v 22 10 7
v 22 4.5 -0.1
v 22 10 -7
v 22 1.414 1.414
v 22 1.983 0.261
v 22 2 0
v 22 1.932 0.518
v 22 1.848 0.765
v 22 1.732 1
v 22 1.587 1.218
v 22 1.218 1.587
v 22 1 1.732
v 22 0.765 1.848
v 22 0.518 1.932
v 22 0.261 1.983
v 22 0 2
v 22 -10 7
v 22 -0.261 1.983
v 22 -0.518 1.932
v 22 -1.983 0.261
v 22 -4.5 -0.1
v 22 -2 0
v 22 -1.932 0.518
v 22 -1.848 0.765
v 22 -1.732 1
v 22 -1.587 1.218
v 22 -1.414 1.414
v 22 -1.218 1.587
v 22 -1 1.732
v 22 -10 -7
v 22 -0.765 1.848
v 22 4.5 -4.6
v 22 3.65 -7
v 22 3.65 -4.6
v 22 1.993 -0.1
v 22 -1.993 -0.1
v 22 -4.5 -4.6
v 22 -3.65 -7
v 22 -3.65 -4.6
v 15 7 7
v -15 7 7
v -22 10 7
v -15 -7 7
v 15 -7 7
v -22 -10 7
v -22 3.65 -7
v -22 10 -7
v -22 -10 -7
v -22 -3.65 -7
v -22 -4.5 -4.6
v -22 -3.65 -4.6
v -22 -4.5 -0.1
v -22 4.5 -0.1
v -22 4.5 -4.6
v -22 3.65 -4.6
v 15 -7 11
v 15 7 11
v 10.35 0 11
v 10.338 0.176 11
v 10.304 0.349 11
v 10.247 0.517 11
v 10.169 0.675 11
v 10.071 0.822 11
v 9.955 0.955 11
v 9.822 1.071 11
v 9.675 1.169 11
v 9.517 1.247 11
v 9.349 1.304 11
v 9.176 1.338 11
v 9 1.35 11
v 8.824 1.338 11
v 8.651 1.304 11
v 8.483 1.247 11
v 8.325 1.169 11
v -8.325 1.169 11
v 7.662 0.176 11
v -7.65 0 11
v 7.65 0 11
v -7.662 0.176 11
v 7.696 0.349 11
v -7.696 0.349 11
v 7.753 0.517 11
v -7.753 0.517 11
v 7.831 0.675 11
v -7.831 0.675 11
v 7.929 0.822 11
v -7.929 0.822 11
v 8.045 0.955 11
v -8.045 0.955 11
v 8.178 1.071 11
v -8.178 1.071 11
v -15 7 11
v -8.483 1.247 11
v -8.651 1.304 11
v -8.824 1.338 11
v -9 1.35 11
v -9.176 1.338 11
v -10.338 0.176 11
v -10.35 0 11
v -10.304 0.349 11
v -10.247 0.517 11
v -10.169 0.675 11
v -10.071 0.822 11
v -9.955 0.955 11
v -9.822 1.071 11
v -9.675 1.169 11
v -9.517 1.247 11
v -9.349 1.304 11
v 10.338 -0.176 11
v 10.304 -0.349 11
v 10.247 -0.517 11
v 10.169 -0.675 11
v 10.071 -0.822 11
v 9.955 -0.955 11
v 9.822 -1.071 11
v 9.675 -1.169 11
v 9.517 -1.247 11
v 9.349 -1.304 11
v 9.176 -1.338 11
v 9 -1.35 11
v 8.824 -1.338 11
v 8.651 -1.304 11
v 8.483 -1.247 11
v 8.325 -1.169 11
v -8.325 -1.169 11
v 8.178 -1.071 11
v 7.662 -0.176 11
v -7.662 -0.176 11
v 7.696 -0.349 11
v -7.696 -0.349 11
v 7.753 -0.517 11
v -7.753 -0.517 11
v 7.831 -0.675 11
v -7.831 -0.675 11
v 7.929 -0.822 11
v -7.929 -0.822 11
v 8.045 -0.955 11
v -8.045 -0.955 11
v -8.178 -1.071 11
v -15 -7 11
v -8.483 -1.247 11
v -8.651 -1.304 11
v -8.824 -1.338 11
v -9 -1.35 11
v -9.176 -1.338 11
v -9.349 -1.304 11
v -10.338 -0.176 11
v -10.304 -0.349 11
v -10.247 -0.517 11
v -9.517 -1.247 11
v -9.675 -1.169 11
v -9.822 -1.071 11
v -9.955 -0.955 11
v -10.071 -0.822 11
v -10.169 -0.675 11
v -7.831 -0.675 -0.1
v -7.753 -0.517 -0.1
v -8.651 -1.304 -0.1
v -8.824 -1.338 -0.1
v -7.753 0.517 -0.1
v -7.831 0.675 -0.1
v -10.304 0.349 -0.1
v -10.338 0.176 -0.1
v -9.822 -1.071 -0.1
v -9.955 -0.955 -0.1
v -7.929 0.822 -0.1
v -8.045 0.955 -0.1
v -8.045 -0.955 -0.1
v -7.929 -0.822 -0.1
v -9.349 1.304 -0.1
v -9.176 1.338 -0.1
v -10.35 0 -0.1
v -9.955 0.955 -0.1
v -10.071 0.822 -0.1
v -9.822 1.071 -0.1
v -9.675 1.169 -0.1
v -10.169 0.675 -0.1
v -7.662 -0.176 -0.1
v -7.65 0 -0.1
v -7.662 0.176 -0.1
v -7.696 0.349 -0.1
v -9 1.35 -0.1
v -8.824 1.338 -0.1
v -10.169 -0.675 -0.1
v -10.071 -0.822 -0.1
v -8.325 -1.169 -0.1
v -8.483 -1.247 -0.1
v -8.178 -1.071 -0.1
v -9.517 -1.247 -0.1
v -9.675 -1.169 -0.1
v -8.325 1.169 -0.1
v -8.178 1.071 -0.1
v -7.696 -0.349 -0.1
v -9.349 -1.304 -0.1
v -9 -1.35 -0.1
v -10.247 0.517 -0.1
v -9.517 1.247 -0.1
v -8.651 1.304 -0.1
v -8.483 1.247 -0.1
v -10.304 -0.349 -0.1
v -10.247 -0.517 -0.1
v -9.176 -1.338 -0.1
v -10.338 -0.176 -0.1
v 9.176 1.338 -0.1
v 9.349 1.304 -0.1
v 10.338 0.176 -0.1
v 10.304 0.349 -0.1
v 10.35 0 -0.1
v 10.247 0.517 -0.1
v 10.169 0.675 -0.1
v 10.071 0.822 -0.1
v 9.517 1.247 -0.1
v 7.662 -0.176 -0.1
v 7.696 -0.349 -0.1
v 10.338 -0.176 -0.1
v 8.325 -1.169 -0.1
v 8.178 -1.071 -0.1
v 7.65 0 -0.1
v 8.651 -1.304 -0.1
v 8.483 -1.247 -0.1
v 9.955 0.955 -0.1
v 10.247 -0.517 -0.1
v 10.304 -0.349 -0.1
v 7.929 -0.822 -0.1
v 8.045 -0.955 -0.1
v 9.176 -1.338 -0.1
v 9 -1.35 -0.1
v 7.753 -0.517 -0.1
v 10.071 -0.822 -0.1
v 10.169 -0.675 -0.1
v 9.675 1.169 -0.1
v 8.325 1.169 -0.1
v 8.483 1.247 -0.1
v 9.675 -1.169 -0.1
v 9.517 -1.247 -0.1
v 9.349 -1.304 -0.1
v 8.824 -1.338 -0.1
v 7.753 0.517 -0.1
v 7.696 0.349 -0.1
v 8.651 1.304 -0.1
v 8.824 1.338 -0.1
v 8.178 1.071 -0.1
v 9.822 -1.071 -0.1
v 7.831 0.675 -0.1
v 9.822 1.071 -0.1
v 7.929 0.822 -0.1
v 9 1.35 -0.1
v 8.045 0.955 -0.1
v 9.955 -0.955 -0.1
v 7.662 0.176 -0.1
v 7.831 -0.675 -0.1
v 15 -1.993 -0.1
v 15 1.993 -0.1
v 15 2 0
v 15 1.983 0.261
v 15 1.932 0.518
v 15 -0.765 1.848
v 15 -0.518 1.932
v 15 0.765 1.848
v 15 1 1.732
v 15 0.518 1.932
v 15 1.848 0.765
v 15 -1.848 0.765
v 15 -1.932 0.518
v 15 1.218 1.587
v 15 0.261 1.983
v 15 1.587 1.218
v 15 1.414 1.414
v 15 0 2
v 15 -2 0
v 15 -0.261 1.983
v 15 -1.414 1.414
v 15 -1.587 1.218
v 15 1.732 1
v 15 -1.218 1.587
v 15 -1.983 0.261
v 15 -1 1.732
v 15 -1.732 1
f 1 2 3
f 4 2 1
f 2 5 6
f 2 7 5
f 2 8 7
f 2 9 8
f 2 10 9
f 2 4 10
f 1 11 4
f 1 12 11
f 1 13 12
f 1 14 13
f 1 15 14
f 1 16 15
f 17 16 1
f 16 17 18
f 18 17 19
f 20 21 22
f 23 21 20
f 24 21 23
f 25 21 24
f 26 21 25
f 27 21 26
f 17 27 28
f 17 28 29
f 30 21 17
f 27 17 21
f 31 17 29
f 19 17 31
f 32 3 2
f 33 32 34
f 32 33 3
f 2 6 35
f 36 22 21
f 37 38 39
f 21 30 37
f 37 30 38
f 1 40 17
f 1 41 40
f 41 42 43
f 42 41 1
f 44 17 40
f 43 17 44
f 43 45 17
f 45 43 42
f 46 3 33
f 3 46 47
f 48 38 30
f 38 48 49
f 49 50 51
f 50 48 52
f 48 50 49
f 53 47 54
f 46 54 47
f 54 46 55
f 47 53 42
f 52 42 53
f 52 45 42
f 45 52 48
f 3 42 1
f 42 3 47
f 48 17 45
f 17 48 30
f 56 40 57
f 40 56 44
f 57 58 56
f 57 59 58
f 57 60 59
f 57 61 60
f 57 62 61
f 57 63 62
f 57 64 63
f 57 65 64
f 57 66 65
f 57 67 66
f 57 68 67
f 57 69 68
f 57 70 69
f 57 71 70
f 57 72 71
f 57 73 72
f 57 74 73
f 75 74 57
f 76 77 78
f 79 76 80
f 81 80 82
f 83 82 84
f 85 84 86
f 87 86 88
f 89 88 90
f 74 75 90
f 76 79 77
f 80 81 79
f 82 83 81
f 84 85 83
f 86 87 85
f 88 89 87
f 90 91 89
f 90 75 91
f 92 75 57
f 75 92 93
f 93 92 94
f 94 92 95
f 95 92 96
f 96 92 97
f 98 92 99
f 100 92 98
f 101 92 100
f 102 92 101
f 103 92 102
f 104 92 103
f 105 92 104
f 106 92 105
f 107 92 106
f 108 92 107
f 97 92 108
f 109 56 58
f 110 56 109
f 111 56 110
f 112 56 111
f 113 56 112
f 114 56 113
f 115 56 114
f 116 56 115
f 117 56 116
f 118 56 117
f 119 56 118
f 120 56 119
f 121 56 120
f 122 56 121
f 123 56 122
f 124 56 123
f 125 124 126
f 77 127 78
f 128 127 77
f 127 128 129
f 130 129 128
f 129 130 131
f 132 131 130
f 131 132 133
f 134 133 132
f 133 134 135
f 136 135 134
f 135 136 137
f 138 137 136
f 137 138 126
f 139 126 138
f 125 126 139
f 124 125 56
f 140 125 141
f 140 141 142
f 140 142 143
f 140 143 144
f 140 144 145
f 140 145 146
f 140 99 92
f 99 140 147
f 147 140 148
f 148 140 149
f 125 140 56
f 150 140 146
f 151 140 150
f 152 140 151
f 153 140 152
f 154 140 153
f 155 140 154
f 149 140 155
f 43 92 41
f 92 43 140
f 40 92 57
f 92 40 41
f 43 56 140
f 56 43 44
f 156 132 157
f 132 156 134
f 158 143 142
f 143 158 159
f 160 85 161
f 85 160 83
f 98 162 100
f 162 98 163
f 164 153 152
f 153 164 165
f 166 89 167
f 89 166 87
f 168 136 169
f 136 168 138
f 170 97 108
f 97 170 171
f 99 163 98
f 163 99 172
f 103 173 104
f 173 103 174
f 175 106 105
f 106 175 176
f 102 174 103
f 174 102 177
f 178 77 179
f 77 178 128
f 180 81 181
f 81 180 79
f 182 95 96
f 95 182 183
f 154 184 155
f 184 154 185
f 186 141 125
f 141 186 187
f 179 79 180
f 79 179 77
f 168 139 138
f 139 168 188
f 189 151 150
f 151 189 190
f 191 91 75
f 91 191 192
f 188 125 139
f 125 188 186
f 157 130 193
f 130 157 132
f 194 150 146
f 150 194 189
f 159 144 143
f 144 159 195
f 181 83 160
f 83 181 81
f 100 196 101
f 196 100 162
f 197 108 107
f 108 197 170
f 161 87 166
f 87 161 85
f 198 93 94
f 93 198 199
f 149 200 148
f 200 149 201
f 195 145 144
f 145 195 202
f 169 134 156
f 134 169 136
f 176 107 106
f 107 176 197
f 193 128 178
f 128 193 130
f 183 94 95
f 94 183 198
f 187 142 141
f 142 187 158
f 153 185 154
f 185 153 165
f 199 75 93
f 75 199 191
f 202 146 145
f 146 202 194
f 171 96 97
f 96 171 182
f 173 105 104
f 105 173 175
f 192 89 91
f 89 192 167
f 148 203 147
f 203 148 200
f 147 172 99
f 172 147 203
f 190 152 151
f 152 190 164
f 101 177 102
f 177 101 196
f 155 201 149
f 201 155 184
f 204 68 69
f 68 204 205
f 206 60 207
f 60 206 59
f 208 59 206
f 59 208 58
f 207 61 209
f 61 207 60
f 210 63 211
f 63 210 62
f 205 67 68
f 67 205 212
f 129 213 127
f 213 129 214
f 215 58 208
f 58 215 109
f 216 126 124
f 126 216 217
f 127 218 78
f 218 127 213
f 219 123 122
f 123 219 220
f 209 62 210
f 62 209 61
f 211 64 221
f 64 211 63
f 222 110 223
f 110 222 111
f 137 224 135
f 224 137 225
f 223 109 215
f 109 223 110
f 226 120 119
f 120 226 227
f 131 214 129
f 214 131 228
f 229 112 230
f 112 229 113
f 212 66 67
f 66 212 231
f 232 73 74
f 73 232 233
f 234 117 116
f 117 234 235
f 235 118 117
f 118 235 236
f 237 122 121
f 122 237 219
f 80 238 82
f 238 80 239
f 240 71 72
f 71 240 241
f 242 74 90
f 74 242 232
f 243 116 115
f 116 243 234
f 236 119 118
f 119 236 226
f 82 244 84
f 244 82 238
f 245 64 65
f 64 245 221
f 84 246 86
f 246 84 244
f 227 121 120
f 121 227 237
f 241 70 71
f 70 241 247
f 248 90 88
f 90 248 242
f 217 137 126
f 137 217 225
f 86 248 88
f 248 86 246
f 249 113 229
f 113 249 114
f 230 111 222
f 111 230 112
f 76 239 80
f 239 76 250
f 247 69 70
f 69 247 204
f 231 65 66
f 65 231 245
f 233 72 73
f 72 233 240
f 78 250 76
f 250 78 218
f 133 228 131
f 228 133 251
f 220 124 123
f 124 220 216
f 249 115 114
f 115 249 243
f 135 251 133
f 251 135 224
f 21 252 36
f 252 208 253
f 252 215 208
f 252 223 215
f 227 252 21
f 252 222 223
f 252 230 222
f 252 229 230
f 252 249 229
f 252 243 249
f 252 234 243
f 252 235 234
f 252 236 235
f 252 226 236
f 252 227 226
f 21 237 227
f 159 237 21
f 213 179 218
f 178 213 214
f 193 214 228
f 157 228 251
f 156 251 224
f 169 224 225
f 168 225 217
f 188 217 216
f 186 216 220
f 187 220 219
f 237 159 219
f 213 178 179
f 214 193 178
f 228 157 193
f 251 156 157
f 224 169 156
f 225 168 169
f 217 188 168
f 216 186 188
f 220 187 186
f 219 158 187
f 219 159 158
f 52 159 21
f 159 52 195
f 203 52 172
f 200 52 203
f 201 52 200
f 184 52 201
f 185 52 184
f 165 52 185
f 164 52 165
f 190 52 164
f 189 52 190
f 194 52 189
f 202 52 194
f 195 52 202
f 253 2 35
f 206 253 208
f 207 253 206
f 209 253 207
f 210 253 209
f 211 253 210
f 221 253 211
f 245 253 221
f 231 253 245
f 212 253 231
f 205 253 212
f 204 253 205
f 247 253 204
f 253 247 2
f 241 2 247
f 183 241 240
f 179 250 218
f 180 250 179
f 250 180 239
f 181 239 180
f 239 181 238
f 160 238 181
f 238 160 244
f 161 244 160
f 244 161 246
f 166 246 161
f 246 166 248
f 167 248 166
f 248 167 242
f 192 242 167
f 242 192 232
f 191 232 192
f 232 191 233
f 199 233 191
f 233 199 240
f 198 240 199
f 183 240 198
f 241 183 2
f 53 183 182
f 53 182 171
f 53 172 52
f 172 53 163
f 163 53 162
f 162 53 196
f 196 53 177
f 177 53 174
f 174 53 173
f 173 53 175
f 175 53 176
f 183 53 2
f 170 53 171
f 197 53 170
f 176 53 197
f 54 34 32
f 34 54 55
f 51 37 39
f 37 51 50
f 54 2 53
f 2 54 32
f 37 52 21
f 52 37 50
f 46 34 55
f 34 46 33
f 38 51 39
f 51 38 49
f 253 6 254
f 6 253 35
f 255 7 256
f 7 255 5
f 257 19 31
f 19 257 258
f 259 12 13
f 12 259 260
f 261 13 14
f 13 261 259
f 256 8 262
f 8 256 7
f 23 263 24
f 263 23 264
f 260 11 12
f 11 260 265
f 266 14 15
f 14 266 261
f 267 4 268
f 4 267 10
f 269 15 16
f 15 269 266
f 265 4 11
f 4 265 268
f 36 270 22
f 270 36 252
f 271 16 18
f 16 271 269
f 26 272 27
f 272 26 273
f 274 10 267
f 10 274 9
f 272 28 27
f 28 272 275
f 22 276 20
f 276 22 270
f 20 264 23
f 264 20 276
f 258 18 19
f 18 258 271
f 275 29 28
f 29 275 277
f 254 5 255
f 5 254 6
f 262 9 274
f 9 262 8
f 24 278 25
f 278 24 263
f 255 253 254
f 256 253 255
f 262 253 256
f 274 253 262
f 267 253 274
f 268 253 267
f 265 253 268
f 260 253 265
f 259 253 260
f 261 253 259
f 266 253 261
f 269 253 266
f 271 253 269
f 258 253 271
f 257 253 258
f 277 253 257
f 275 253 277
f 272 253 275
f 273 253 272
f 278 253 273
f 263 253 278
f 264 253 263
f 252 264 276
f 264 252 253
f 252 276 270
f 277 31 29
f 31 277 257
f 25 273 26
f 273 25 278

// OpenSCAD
// GIG design-stage CAD concept: clip-on temple sensor/control module.
// Units: mm. This is not a validated wearable or a fit for any named device.
// Measure the chosen glasses frame and components before printing.

temple_width = 8.5;       // replace with measured frame width
temple_height = 4.0;      // replace with measured frame thickness
fit_clearance = 0.5;      // tune with a short test print
module_length = 44;
module_width = 20;
module_height = 14;
mount_wall = 2.4;
hole_diameter = 2.7;     // nominal clearance for M2.5 fasteners
hole_spacing = 18;
$fn = 48;

// A saddle for a straight, non-certified training frame temple.
// Two screw holes provide a generic top mounting plane for a camera or control PCB.
// The underside channel and tie slots are placeholders for fit testing.
module temple_module() {
    difference() {
        union() {
            cube([module_length, module_width, module_height], center=true);
            translate([0, 0, module_height/2 + 2])
                cube([30, 14, 4], center=true);
        }

        // Longitudinal temple channel, open at both ends.
        translate([0, 0, -module_height/2 + mount_wall +
                   (temple_height + fit_clearance)/2])
            cube([module_length + 1,
                  temple_width + fit_clearance,
                  temple_height + fit_clearance], center=true);

        // Narrow underside entry slot. Do not assume it will snap onto a frame.
        translate([0, 0, -module_height/2 - 0.8])
            cube([module_length + 1,
                  temple_width - 1.2,
                  2*mount_wall + 2.4], center=true);

        // Generic top holes. Replace with the actual selected module footprint.
        for (x = [-hole_spacing/2, hole_spacing/2])
            translate([x, 0, module_height/2 + 2])
                cylinder(h=module_height + 10, d=hole_diameter, center=true);

        // Cable clearance at the rear end.
        translate([module_length/2 - 3, 0, 0])
            rotate([0, 90, 0]) cylinder(h=8, d=4.0, center=true);
    }
}

temple_module();
